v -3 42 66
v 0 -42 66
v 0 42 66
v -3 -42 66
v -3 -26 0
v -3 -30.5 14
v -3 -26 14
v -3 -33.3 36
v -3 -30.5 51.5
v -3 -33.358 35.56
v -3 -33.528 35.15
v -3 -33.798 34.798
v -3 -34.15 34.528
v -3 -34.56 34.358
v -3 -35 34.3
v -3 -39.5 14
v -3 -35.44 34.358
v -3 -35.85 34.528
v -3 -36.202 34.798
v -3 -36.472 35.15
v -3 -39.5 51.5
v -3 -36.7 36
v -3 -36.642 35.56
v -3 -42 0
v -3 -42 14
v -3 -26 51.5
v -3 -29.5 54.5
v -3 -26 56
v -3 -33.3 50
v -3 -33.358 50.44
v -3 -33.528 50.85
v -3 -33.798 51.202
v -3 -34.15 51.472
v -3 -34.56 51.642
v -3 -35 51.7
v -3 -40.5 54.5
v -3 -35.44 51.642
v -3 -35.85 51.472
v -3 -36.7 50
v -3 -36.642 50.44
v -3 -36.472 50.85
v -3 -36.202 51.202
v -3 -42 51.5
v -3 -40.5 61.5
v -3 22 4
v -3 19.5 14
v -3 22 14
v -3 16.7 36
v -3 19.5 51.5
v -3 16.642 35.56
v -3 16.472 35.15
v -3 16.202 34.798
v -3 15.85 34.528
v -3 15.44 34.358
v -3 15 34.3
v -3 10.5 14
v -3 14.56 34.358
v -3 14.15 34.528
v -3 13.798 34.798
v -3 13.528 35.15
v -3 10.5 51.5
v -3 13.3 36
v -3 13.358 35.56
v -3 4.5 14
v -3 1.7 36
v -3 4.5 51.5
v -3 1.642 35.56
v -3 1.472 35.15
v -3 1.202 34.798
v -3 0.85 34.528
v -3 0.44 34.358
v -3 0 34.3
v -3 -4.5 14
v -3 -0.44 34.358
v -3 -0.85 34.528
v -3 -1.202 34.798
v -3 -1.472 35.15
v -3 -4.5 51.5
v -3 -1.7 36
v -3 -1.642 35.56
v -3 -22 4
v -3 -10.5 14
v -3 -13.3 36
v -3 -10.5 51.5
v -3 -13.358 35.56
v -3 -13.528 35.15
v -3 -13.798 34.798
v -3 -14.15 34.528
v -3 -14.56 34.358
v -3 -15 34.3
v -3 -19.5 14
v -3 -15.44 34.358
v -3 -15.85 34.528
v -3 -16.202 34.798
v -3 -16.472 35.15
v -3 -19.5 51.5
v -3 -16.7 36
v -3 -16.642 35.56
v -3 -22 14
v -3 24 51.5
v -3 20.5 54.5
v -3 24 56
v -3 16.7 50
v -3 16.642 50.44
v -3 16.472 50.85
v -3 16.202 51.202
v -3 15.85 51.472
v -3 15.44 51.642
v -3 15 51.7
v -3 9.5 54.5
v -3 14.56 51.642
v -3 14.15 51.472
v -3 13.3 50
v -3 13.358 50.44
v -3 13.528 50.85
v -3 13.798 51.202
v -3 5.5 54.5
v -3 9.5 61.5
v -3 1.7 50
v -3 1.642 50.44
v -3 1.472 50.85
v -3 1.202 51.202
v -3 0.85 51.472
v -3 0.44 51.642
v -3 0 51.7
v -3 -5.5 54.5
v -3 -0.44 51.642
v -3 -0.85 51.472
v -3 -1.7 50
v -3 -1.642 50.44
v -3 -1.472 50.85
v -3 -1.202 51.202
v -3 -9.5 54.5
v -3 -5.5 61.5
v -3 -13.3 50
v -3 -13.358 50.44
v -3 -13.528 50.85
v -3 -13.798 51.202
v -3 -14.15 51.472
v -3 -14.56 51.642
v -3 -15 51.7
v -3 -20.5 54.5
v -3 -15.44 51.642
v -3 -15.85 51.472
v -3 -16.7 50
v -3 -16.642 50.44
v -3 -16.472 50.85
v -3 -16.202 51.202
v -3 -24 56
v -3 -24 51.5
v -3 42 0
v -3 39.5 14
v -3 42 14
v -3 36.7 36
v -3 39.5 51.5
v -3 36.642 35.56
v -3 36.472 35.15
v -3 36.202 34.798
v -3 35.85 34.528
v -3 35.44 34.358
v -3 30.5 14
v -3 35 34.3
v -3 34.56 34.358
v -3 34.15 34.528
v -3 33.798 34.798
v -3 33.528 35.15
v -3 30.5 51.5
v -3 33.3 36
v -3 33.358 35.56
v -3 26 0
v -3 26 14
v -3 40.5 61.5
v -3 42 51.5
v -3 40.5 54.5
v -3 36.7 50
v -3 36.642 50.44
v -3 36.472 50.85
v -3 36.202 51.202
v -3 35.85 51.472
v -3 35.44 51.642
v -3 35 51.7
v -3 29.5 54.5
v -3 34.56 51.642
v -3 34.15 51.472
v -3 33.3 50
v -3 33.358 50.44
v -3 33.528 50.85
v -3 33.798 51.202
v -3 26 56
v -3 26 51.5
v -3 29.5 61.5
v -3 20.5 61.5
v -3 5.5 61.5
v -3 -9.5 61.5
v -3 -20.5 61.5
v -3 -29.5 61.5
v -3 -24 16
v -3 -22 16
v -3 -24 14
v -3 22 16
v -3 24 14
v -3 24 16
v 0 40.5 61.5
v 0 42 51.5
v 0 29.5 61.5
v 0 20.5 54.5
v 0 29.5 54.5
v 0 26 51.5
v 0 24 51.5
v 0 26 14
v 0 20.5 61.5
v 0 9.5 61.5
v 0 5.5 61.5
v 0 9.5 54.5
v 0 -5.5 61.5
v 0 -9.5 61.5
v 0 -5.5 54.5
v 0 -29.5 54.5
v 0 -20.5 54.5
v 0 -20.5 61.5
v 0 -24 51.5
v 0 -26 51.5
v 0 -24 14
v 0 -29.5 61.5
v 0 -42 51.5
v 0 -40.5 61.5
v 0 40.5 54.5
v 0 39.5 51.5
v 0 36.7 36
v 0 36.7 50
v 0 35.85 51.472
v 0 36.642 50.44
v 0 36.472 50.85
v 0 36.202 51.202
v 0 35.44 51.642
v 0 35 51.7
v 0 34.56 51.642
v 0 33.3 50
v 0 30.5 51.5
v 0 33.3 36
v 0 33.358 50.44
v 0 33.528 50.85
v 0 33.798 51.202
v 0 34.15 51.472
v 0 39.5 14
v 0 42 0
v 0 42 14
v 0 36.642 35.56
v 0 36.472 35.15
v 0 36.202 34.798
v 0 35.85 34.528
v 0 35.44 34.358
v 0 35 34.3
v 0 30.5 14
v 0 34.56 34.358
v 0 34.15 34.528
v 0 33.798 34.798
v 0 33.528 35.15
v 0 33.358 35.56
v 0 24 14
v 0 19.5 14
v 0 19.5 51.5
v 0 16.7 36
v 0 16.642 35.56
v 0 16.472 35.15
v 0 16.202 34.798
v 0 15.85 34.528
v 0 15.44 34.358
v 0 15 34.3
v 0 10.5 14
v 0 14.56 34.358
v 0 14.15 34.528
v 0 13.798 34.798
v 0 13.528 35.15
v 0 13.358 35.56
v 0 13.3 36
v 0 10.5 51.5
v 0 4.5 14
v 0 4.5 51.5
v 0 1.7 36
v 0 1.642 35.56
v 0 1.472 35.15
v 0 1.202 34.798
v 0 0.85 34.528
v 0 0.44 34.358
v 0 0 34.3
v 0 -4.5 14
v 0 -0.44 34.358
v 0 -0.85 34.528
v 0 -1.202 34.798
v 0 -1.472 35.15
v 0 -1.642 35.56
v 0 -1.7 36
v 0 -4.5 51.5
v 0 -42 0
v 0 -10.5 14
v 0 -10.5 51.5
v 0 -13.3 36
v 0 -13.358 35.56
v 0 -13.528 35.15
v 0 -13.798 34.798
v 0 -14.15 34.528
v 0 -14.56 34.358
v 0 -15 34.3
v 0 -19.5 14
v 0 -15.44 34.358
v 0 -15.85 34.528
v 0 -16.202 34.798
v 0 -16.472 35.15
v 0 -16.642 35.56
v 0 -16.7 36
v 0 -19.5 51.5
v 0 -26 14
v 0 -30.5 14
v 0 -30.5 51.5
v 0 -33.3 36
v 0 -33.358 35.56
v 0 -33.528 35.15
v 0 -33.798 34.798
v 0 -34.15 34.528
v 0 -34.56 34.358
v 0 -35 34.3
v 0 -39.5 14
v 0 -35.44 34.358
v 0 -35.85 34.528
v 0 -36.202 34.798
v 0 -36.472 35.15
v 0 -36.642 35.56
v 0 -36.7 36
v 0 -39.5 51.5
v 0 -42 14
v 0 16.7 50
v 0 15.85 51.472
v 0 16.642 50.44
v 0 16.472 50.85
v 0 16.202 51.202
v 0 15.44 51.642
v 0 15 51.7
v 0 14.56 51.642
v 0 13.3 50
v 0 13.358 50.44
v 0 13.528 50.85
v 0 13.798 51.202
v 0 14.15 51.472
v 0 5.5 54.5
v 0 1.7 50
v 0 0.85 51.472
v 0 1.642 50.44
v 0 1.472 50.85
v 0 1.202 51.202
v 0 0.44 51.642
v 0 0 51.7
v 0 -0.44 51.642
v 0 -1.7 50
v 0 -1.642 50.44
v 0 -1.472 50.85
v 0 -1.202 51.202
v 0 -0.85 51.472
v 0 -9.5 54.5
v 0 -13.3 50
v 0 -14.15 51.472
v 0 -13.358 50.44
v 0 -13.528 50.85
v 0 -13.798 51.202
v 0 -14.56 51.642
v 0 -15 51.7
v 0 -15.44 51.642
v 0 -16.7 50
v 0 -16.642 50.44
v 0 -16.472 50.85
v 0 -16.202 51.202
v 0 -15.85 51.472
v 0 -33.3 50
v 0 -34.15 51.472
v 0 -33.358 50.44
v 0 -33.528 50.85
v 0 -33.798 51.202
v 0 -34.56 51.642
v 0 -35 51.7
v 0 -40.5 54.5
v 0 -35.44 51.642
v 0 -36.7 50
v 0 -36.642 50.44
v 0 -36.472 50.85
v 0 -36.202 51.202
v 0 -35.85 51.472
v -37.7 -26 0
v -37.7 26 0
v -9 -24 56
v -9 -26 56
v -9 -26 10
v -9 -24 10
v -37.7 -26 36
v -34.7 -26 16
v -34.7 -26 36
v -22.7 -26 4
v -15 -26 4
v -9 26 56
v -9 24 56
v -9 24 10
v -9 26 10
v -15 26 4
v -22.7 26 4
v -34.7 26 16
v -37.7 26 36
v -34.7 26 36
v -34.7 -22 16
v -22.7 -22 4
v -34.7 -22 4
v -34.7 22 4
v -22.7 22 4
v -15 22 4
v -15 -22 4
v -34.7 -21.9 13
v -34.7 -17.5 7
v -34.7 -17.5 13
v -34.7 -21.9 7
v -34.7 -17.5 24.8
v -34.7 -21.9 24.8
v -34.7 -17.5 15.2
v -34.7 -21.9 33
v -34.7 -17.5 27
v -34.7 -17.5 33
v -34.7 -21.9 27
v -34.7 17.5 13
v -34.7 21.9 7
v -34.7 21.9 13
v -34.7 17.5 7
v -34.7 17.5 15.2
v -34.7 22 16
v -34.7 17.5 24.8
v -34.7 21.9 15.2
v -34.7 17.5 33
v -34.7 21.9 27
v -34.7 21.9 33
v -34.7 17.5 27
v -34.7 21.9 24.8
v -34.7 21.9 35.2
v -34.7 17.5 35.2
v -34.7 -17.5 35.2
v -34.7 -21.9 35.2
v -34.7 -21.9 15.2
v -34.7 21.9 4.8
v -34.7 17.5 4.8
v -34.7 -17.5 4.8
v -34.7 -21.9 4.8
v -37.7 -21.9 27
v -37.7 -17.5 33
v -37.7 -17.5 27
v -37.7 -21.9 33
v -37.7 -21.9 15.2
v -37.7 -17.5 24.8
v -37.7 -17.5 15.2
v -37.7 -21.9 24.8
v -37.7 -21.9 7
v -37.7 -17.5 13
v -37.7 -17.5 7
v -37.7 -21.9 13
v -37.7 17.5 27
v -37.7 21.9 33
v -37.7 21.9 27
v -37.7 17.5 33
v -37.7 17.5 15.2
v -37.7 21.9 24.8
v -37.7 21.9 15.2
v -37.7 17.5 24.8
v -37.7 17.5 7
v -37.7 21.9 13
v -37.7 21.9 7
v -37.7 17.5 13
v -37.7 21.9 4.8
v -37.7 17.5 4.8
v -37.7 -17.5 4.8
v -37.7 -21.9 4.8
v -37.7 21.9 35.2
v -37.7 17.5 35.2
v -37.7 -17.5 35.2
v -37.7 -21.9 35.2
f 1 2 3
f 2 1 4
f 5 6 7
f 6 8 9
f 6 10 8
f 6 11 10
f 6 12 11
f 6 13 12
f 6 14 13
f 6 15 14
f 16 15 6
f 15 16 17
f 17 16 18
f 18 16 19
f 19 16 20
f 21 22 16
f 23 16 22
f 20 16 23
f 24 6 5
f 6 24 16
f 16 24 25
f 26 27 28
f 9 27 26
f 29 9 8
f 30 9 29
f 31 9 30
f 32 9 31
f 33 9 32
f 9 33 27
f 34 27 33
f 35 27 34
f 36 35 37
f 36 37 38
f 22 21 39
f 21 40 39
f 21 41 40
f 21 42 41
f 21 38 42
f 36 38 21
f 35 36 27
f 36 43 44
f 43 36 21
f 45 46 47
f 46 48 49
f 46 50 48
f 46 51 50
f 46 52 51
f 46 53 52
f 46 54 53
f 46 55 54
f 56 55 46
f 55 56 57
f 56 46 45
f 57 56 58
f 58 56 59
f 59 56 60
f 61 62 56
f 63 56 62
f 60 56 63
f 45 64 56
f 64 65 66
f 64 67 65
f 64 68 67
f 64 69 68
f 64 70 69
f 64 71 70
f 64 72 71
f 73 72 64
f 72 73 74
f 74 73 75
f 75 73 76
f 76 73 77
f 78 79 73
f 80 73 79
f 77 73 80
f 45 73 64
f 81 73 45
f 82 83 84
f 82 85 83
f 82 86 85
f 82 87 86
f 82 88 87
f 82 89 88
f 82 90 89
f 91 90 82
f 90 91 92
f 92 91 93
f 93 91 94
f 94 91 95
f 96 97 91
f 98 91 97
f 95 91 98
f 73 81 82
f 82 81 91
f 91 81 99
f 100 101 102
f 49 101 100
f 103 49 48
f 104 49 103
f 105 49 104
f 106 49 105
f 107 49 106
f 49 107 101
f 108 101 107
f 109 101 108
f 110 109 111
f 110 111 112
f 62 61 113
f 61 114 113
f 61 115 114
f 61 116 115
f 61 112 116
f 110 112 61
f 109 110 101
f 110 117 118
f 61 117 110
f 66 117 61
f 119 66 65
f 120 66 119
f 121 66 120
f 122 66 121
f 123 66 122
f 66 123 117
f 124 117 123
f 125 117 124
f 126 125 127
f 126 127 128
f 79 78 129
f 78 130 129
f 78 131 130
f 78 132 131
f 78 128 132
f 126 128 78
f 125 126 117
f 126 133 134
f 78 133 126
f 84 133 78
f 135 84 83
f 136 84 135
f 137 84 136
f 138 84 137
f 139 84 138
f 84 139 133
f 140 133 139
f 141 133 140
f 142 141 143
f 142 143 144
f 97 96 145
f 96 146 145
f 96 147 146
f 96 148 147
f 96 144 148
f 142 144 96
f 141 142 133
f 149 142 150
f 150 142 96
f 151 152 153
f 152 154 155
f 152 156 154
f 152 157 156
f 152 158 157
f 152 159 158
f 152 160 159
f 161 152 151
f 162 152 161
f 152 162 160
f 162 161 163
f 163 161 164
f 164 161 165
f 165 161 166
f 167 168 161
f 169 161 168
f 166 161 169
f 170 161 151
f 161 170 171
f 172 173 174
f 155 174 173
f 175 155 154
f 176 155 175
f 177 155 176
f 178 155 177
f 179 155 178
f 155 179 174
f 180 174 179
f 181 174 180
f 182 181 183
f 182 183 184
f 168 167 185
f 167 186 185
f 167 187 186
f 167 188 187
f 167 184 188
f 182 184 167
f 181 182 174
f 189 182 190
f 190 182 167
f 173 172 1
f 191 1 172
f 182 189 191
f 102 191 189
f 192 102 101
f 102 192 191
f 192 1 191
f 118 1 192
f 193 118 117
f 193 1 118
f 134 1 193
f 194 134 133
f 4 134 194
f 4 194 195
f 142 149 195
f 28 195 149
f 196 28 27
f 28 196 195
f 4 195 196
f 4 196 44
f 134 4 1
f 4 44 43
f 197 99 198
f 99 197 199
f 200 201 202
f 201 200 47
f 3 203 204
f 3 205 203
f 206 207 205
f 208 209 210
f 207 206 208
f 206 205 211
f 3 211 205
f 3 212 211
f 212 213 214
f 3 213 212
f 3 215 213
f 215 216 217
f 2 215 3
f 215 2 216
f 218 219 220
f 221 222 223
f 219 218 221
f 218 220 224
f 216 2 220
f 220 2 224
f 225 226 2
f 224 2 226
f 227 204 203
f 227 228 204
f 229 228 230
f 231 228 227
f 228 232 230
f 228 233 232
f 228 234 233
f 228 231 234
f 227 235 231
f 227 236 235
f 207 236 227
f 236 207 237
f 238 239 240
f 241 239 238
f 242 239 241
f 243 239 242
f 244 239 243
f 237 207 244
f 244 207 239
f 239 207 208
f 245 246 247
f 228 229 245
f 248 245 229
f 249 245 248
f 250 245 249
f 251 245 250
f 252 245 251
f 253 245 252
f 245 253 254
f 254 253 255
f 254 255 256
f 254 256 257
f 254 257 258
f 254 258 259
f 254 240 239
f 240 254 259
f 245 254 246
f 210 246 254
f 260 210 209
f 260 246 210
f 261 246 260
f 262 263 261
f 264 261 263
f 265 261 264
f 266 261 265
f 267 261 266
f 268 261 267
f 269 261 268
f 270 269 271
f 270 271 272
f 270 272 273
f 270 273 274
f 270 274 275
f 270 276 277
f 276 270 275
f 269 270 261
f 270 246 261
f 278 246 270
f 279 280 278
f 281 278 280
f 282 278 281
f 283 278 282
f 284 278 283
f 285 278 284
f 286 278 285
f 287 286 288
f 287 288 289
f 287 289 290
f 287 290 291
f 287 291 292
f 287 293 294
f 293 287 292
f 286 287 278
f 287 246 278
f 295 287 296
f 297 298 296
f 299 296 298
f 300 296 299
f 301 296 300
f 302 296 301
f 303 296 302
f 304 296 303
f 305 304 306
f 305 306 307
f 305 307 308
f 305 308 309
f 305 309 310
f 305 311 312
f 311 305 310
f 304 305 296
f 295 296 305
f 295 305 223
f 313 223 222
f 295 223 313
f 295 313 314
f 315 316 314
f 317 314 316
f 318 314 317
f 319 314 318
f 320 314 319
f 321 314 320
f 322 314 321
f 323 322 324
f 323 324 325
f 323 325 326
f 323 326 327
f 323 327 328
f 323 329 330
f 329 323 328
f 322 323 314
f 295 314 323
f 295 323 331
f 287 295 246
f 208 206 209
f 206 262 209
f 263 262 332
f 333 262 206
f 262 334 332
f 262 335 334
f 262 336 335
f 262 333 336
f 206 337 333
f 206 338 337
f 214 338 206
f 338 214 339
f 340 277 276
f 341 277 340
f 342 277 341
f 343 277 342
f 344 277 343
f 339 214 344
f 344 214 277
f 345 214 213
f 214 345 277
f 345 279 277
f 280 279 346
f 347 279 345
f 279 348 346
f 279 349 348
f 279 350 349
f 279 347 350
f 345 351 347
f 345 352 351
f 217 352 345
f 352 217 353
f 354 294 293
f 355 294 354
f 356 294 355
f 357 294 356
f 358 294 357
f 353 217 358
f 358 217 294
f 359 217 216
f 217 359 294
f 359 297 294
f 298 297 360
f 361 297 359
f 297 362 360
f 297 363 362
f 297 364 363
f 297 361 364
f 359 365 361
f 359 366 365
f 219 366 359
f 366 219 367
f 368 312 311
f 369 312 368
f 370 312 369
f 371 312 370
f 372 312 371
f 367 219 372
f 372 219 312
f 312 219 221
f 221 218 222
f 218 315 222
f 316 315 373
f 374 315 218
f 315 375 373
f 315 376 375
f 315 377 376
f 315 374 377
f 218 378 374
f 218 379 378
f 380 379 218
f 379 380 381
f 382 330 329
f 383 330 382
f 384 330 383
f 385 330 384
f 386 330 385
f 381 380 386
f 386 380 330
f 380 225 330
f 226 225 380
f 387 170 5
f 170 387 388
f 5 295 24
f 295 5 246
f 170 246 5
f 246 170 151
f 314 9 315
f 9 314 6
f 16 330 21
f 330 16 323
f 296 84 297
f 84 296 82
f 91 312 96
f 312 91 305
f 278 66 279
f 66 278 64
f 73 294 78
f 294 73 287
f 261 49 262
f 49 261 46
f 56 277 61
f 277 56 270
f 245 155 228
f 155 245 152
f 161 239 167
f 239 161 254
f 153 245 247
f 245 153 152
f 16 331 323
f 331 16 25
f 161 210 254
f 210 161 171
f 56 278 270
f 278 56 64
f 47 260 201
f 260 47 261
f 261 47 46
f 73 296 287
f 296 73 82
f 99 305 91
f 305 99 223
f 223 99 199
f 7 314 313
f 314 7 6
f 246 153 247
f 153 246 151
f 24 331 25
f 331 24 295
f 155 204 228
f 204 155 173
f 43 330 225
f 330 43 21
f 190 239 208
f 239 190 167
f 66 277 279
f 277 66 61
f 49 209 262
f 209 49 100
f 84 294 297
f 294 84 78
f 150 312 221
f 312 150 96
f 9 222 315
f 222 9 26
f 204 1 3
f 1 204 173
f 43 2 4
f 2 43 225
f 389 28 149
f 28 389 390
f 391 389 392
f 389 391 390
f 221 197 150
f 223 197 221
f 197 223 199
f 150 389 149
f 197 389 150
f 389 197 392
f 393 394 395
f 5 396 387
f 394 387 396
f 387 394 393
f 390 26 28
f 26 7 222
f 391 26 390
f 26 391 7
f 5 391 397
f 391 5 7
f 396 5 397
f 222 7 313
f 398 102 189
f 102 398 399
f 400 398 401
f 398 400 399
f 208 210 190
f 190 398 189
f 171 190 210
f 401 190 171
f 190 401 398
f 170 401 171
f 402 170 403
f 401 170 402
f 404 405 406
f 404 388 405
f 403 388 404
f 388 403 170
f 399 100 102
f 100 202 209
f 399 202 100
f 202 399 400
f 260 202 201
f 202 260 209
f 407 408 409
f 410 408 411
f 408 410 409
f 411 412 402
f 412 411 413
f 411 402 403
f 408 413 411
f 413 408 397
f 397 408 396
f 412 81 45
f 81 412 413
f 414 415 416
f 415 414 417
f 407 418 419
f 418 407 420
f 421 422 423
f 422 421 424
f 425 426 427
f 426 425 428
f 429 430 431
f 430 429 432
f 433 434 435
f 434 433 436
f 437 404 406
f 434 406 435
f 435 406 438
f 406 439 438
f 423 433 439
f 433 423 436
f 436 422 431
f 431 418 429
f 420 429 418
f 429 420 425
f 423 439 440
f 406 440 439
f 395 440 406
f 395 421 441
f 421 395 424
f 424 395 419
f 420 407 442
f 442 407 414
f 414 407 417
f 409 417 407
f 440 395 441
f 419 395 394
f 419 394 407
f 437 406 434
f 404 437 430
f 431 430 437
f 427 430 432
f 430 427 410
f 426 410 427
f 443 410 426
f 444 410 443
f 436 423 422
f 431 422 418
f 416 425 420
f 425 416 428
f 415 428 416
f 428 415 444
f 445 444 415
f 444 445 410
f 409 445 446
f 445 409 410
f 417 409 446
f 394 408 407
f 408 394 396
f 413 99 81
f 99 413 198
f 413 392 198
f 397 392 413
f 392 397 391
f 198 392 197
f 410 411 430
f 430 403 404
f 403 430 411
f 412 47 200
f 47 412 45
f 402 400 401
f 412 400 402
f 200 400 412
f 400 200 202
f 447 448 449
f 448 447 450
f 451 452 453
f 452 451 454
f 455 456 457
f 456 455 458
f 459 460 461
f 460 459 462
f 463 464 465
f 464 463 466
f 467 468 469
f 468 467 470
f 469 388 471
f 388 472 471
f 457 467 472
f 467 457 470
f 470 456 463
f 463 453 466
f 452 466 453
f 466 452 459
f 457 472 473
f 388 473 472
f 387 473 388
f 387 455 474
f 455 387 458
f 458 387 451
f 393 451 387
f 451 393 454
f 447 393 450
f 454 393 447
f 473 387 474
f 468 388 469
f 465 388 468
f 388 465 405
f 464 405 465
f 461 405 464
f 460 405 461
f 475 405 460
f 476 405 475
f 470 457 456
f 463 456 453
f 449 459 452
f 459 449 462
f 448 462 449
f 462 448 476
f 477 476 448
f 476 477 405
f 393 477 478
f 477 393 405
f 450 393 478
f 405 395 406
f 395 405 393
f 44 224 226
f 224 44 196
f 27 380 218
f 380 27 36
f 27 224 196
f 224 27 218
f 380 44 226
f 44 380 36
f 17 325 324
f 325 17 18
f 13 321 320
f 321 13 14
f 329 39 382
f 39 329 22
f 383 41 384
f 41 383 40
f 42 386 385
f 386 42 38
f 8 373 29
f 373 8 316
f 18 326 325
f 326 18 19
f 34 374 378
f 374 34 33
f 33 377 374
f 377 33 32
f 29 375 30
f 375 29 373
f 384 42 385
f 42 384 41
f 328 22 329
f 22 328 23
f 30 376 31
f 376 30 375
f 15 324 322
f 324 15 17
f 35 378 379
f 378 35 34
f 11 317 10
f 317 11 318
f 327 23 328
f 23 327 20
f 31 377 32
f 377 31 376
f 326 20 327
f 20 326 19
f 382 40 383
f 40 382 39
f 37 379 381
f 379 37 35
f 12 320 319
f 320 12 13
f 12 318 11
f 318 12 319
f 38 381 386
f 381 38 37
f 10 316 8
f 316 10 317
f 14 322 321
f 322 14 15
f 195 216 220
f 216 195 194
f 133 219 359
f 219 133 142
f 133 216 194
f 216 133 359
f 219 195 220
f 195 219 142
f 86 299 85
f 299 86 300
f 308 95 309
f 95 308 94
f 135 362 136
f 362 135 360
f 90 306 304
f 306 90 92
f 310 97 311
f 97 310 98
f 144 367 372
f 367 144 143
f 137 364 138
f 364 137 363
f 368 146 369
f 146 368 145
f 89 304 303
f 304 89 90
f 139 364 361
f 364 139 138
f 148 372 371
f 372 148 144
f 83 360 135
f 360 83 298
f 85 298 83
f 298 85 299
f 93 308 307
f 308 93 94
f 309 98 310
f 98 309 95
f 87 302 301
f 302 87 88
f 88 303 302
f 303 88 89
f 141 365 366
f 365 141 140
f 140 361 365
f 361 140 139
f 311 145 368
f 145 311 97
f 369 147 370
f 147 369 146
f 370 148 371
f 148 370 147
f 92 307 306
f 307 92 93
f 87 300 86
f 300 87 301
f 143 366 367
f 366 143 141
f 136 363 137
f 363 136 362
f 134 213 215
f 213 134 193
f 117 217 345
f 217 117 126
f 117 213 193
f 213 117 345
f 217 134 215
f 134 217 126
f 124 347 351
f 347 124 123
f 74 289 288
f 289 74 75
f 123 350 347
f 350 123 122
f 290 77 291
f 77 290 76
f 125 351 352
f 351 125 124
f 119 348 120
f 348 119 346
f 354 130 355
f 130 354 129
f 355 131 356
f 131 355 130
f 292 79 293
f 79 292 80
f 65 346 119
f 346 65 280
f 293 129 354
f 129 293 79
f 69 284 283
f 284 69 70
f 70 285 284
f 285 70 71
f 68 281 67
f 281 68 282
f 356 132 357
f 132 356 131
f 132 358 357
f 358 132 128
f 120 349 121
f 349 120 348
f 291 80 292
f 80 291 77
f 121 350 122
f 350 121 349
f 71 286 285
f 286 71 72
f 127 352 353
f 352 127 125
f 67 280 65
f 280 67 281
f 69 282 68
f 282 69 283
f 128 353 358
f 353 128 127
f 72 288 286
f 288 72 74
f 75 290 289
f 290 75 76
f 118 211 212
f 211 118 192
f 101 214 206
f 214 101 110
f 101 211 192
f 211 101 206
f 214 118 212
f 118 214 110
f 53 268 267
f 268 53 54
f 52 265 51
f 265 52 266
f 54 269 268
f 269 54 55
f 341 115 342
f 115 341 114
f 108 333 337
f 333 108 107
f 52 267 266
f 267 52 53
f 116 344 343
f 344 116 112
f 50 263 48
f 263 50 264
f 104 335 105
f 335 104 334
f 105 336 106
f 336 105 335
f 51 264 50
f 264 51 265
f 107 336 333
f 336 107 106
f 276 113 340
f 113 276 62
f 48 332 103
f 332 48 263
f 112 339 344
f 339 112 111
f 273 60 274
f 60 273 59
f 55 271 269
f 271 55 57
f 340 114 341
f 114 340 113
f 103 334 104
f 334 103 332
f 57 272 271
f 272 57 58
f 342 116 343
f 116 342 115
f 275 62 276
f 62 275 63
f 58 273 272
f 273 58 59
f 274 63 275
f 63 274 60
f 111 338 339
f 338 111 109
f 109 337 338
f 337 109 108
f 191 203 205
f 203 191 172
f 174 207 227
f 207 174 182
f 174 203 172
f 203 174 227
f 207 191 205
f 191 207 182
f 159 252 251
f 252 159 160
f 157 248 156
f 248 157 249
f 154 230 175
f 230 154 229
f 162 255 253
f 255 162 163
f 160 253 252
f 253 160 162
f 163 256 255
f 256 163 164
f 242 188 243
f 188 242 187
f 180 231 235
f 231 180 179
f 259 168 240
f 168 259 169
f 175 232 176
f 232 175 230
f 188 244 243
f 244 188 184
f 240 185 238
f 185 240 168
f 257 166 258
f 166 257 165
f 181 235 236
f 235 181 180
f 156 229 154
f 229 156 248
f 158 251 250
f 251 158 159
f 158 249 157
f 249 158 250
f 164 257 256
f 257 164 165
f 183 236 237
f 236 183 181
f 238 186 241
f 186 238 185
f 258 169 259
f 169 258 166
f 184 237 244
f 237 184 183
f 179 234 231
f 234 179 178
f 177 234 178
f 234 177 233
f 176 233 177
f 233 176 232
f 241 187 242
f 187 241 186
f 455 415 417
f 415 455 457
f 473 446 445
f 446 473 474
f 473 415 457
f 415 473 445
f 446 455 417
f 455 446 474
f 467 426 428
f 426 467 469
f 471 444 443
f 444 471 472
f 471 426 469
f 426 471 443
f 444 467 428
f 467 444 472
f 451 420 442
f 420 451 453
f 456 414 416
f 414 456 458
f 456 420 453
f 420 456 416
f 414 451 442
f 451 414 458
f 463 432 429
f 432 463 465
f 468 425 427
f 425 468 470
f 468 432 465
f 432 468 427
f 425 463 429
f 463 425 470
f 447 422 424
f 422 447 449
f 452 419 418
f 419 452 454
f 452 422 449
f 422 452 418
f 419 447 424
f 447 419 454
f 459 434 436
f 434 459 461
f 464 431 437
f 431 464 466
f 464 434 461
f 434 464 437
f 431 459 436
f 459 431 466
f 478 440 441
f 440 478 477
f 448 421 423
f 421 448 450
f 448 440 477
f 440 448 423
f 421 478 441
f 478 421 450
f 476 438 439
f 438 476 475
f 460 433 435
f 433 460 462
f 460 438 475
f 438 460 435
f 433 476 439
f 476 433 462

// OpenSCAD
// ======================================================================
//  КРОНШТЕЙН ДАТЧИКІВ ЛІНІЇ (TCRT5000) · sosny · BEST EC Day 2 (TD)
//
//  Форма «С»: зверху полиця (як у motor_holder / free_wheel — ті самі
//  прорізи під стяжки, крок ламелей 20 мм), ззаду стінка, знизу площадка.
//  Модулі TCRT5000 лежать на площадці, сенсор дивиться вниз крізь вікно.
//  Розклад сенсорів — з плану Віталія (claude/day2-plan.md):
//  L / C / R з кроком 15 мм + 4-й (поперечні лінії) на 35 мм збоку.
//  Вікна: −35, −15, 0, +15, +35 — 4-й ставиться в будь-яке крайнє вікно. Модуль кріпиться гвинтом М3
//  у поздовжній паз (підходить під різні модулі) або стяжкою.
//
//  ВИСОТА (рахується сама з параметрів нижче):
//    рама над підлогою = wheel_d/2 + axle_to_frame = 33 + 14.7 = 47.7 мм
//    верх площадки     = sensor_gap + tcrt_h       = 6 + 7      = 13 мм
//    кінчик сенсора    = 6 мм над підлогою (план: 5–8 мм)
//  !!! ЗАМІРЯТИ tcrt_h: від плати модуля до кінчика сенсора !!!
//
//  Друк: PLA 0.28, 3 стінки, 25 %, БЕЗ підтримок, стінкою на стіл
//  (print_orient = true — STL уже так повернутий).
// ======================================================================

print_orient = true;

// --- висоти ---
wheel_d       = 66;    // колесо з шиною (заміряно)
axle_to_frame = 14.7;  // від осі до низу рами (motor_holder / free_wheel)
tcrt_h        = 7;     // від плати модуля до кінчика сенсора — ЗАМІРЯТИ
sensor_gap    = 6;     // кінчик сенсора → підлога (план Віталія: 5–8 мм)
plat_t        = 3;     // товщина площадки

frame_z = wheel_d/2 + axle_to_frame;     // 47.7
plat_top = sensor_gap + tcrt_h;          // 13
plat_bot = plat_top - plat_t;            // 10

// --- форма ---
wid      = 84;     // ширина площадки (Y) ±42; стінка = ширина полиці,
                   // щоб не зачепити редуктори моторів збоку
wall_t   = 4;
top_rib_y   = [-25, 25]; // вертикальні ребра жорсткості зверху — між модулями ±15 і ±35
top_rib_w   = 2;
top_rib_h   = 6;
top_rib_len = 56;     // від стінки до смуги з вікнами — зв'язує «драбинку»
plat_len = 66;     // площадка вперед від задньої грані стінки
flange_len = 36;
flange_w = 52;
flange_t = 3;

// --- вікна під сенсори ---
win_y    = [-35, -15, 0, 15, 35];
win_x    = plat_len - 8;   // центр вікон від задньої грані (58 мм)
win_dx   = 7;              // вздовж руху
win_dy   = 11;             // поперек
m3_w     = 3.4;            // паз під М3
m3_from  = 8;              // паз від центру вікна назад: від…
m3_to    = 22;             // …до

// --- прорізи під стяжки (як в інших тримачах) ---
slot_l = 4.4; slot_w = 2.2; slat_pitch = 20; slat_w = 5; out_y = 25.4;
gus = 12;  // косинки
lite  = true;  // площадка-«драбинка»: смуга з вікнами + ребра під модулі (на ~40 % менше пластику)
rear_w = 14;   // смуга біля стінки
rib_w  = 9;    // ребро під модуль (паз М3 посередині)

module tri(a, b) {  // косинка в площині X-Z, товщина 4 по Y
    rotate([90, 0, 0]) linear_extrude(4, center = true)
        polygon([[0, 0], [a, 0], [0, b]]);
}

module bracket() {
    difference() {
        union() {
            translate([0, -flange_w/2, plat_bot]) cube([wall_t, flange_w, frame_z - plat_bot]);   // стінка
            translate([0, -flange_w/2, frame_z - flange_t]) cube([flange_len, flange_w, flange_t]); // полиця
            if (!lite) translate([0, -wid/2, plat_bot]) cube([plat_len, wid, plat_t]);   // суцільна площадка
            else {                                                                      // «драбинка» — швидше друкується
                translate([0, -wid/2, plat_bot]) cube([rear_w, wid, plat_t]);                         // біля стінки
                translate([win_x - win_dx/2 - 3, -wid/2, plat_bot]) cube([plat_len - (win_x - win_dx/2 - 3), wid, plat_t]); // смуга з вікнами
                for (y = win_y) translate([0, y - rib_w/2, plat_bot]) cube([plat_len, rib_w, plat_t]);  // ребро під кожен модуль
            }
            for (ry = top_rib_y)
                translate([0, ry - top_rib_w/2, plat_bot]) cube([top_rib_len, top_rib_w, plat_t + top_rib_h]);
            for (sy = [-1, 1]) {
                translate([wall_t, sy*(flange_w/2 - 2), frame_z - flange_t]) mirror([0, 0, 1]) tri(gus, gus);
                translate([wall_t, sy*(flange_w/2 - 2), plat_top]) tri(gus, gus);
            }
        }
        // вікна + пази М3
        for (y = win_y) {
            translate([win_x - win_dx/2, y - win_dy/2, plat_bot - 1]) cube([win_dx, win_dy, plat_t + 2]);
            hull() for (dx = [m3_from, m3_to])
                translate([win_x - dx, y, plat_bot - 1]) cylinder(d = m3_w, h = plat_t + 2, $fn = 24);
        }
        // прорізи під стяжки в полиці
        xc0 = wall_t + (flange_len - wall_t - slat_pitch)/2;
        for (xc = [xc0, xc0 + slat_pitch], dx = [-1, 1], sy = [-1, 1])
            translate([xc + dx*(slat_w/2 + 0.5 + slot_w/2) - slot_w/2,
                       sy*(out_y/2 + 7) - slot_l/2, frame_z - flange_t - 1])
                cube([slot_w, slot_l, flange_t + 2]);
    }
}

if (print_orient) rotate([0, -90, 0]) translate([0, 0, -plat_bot]) bracket();
else bracket();
